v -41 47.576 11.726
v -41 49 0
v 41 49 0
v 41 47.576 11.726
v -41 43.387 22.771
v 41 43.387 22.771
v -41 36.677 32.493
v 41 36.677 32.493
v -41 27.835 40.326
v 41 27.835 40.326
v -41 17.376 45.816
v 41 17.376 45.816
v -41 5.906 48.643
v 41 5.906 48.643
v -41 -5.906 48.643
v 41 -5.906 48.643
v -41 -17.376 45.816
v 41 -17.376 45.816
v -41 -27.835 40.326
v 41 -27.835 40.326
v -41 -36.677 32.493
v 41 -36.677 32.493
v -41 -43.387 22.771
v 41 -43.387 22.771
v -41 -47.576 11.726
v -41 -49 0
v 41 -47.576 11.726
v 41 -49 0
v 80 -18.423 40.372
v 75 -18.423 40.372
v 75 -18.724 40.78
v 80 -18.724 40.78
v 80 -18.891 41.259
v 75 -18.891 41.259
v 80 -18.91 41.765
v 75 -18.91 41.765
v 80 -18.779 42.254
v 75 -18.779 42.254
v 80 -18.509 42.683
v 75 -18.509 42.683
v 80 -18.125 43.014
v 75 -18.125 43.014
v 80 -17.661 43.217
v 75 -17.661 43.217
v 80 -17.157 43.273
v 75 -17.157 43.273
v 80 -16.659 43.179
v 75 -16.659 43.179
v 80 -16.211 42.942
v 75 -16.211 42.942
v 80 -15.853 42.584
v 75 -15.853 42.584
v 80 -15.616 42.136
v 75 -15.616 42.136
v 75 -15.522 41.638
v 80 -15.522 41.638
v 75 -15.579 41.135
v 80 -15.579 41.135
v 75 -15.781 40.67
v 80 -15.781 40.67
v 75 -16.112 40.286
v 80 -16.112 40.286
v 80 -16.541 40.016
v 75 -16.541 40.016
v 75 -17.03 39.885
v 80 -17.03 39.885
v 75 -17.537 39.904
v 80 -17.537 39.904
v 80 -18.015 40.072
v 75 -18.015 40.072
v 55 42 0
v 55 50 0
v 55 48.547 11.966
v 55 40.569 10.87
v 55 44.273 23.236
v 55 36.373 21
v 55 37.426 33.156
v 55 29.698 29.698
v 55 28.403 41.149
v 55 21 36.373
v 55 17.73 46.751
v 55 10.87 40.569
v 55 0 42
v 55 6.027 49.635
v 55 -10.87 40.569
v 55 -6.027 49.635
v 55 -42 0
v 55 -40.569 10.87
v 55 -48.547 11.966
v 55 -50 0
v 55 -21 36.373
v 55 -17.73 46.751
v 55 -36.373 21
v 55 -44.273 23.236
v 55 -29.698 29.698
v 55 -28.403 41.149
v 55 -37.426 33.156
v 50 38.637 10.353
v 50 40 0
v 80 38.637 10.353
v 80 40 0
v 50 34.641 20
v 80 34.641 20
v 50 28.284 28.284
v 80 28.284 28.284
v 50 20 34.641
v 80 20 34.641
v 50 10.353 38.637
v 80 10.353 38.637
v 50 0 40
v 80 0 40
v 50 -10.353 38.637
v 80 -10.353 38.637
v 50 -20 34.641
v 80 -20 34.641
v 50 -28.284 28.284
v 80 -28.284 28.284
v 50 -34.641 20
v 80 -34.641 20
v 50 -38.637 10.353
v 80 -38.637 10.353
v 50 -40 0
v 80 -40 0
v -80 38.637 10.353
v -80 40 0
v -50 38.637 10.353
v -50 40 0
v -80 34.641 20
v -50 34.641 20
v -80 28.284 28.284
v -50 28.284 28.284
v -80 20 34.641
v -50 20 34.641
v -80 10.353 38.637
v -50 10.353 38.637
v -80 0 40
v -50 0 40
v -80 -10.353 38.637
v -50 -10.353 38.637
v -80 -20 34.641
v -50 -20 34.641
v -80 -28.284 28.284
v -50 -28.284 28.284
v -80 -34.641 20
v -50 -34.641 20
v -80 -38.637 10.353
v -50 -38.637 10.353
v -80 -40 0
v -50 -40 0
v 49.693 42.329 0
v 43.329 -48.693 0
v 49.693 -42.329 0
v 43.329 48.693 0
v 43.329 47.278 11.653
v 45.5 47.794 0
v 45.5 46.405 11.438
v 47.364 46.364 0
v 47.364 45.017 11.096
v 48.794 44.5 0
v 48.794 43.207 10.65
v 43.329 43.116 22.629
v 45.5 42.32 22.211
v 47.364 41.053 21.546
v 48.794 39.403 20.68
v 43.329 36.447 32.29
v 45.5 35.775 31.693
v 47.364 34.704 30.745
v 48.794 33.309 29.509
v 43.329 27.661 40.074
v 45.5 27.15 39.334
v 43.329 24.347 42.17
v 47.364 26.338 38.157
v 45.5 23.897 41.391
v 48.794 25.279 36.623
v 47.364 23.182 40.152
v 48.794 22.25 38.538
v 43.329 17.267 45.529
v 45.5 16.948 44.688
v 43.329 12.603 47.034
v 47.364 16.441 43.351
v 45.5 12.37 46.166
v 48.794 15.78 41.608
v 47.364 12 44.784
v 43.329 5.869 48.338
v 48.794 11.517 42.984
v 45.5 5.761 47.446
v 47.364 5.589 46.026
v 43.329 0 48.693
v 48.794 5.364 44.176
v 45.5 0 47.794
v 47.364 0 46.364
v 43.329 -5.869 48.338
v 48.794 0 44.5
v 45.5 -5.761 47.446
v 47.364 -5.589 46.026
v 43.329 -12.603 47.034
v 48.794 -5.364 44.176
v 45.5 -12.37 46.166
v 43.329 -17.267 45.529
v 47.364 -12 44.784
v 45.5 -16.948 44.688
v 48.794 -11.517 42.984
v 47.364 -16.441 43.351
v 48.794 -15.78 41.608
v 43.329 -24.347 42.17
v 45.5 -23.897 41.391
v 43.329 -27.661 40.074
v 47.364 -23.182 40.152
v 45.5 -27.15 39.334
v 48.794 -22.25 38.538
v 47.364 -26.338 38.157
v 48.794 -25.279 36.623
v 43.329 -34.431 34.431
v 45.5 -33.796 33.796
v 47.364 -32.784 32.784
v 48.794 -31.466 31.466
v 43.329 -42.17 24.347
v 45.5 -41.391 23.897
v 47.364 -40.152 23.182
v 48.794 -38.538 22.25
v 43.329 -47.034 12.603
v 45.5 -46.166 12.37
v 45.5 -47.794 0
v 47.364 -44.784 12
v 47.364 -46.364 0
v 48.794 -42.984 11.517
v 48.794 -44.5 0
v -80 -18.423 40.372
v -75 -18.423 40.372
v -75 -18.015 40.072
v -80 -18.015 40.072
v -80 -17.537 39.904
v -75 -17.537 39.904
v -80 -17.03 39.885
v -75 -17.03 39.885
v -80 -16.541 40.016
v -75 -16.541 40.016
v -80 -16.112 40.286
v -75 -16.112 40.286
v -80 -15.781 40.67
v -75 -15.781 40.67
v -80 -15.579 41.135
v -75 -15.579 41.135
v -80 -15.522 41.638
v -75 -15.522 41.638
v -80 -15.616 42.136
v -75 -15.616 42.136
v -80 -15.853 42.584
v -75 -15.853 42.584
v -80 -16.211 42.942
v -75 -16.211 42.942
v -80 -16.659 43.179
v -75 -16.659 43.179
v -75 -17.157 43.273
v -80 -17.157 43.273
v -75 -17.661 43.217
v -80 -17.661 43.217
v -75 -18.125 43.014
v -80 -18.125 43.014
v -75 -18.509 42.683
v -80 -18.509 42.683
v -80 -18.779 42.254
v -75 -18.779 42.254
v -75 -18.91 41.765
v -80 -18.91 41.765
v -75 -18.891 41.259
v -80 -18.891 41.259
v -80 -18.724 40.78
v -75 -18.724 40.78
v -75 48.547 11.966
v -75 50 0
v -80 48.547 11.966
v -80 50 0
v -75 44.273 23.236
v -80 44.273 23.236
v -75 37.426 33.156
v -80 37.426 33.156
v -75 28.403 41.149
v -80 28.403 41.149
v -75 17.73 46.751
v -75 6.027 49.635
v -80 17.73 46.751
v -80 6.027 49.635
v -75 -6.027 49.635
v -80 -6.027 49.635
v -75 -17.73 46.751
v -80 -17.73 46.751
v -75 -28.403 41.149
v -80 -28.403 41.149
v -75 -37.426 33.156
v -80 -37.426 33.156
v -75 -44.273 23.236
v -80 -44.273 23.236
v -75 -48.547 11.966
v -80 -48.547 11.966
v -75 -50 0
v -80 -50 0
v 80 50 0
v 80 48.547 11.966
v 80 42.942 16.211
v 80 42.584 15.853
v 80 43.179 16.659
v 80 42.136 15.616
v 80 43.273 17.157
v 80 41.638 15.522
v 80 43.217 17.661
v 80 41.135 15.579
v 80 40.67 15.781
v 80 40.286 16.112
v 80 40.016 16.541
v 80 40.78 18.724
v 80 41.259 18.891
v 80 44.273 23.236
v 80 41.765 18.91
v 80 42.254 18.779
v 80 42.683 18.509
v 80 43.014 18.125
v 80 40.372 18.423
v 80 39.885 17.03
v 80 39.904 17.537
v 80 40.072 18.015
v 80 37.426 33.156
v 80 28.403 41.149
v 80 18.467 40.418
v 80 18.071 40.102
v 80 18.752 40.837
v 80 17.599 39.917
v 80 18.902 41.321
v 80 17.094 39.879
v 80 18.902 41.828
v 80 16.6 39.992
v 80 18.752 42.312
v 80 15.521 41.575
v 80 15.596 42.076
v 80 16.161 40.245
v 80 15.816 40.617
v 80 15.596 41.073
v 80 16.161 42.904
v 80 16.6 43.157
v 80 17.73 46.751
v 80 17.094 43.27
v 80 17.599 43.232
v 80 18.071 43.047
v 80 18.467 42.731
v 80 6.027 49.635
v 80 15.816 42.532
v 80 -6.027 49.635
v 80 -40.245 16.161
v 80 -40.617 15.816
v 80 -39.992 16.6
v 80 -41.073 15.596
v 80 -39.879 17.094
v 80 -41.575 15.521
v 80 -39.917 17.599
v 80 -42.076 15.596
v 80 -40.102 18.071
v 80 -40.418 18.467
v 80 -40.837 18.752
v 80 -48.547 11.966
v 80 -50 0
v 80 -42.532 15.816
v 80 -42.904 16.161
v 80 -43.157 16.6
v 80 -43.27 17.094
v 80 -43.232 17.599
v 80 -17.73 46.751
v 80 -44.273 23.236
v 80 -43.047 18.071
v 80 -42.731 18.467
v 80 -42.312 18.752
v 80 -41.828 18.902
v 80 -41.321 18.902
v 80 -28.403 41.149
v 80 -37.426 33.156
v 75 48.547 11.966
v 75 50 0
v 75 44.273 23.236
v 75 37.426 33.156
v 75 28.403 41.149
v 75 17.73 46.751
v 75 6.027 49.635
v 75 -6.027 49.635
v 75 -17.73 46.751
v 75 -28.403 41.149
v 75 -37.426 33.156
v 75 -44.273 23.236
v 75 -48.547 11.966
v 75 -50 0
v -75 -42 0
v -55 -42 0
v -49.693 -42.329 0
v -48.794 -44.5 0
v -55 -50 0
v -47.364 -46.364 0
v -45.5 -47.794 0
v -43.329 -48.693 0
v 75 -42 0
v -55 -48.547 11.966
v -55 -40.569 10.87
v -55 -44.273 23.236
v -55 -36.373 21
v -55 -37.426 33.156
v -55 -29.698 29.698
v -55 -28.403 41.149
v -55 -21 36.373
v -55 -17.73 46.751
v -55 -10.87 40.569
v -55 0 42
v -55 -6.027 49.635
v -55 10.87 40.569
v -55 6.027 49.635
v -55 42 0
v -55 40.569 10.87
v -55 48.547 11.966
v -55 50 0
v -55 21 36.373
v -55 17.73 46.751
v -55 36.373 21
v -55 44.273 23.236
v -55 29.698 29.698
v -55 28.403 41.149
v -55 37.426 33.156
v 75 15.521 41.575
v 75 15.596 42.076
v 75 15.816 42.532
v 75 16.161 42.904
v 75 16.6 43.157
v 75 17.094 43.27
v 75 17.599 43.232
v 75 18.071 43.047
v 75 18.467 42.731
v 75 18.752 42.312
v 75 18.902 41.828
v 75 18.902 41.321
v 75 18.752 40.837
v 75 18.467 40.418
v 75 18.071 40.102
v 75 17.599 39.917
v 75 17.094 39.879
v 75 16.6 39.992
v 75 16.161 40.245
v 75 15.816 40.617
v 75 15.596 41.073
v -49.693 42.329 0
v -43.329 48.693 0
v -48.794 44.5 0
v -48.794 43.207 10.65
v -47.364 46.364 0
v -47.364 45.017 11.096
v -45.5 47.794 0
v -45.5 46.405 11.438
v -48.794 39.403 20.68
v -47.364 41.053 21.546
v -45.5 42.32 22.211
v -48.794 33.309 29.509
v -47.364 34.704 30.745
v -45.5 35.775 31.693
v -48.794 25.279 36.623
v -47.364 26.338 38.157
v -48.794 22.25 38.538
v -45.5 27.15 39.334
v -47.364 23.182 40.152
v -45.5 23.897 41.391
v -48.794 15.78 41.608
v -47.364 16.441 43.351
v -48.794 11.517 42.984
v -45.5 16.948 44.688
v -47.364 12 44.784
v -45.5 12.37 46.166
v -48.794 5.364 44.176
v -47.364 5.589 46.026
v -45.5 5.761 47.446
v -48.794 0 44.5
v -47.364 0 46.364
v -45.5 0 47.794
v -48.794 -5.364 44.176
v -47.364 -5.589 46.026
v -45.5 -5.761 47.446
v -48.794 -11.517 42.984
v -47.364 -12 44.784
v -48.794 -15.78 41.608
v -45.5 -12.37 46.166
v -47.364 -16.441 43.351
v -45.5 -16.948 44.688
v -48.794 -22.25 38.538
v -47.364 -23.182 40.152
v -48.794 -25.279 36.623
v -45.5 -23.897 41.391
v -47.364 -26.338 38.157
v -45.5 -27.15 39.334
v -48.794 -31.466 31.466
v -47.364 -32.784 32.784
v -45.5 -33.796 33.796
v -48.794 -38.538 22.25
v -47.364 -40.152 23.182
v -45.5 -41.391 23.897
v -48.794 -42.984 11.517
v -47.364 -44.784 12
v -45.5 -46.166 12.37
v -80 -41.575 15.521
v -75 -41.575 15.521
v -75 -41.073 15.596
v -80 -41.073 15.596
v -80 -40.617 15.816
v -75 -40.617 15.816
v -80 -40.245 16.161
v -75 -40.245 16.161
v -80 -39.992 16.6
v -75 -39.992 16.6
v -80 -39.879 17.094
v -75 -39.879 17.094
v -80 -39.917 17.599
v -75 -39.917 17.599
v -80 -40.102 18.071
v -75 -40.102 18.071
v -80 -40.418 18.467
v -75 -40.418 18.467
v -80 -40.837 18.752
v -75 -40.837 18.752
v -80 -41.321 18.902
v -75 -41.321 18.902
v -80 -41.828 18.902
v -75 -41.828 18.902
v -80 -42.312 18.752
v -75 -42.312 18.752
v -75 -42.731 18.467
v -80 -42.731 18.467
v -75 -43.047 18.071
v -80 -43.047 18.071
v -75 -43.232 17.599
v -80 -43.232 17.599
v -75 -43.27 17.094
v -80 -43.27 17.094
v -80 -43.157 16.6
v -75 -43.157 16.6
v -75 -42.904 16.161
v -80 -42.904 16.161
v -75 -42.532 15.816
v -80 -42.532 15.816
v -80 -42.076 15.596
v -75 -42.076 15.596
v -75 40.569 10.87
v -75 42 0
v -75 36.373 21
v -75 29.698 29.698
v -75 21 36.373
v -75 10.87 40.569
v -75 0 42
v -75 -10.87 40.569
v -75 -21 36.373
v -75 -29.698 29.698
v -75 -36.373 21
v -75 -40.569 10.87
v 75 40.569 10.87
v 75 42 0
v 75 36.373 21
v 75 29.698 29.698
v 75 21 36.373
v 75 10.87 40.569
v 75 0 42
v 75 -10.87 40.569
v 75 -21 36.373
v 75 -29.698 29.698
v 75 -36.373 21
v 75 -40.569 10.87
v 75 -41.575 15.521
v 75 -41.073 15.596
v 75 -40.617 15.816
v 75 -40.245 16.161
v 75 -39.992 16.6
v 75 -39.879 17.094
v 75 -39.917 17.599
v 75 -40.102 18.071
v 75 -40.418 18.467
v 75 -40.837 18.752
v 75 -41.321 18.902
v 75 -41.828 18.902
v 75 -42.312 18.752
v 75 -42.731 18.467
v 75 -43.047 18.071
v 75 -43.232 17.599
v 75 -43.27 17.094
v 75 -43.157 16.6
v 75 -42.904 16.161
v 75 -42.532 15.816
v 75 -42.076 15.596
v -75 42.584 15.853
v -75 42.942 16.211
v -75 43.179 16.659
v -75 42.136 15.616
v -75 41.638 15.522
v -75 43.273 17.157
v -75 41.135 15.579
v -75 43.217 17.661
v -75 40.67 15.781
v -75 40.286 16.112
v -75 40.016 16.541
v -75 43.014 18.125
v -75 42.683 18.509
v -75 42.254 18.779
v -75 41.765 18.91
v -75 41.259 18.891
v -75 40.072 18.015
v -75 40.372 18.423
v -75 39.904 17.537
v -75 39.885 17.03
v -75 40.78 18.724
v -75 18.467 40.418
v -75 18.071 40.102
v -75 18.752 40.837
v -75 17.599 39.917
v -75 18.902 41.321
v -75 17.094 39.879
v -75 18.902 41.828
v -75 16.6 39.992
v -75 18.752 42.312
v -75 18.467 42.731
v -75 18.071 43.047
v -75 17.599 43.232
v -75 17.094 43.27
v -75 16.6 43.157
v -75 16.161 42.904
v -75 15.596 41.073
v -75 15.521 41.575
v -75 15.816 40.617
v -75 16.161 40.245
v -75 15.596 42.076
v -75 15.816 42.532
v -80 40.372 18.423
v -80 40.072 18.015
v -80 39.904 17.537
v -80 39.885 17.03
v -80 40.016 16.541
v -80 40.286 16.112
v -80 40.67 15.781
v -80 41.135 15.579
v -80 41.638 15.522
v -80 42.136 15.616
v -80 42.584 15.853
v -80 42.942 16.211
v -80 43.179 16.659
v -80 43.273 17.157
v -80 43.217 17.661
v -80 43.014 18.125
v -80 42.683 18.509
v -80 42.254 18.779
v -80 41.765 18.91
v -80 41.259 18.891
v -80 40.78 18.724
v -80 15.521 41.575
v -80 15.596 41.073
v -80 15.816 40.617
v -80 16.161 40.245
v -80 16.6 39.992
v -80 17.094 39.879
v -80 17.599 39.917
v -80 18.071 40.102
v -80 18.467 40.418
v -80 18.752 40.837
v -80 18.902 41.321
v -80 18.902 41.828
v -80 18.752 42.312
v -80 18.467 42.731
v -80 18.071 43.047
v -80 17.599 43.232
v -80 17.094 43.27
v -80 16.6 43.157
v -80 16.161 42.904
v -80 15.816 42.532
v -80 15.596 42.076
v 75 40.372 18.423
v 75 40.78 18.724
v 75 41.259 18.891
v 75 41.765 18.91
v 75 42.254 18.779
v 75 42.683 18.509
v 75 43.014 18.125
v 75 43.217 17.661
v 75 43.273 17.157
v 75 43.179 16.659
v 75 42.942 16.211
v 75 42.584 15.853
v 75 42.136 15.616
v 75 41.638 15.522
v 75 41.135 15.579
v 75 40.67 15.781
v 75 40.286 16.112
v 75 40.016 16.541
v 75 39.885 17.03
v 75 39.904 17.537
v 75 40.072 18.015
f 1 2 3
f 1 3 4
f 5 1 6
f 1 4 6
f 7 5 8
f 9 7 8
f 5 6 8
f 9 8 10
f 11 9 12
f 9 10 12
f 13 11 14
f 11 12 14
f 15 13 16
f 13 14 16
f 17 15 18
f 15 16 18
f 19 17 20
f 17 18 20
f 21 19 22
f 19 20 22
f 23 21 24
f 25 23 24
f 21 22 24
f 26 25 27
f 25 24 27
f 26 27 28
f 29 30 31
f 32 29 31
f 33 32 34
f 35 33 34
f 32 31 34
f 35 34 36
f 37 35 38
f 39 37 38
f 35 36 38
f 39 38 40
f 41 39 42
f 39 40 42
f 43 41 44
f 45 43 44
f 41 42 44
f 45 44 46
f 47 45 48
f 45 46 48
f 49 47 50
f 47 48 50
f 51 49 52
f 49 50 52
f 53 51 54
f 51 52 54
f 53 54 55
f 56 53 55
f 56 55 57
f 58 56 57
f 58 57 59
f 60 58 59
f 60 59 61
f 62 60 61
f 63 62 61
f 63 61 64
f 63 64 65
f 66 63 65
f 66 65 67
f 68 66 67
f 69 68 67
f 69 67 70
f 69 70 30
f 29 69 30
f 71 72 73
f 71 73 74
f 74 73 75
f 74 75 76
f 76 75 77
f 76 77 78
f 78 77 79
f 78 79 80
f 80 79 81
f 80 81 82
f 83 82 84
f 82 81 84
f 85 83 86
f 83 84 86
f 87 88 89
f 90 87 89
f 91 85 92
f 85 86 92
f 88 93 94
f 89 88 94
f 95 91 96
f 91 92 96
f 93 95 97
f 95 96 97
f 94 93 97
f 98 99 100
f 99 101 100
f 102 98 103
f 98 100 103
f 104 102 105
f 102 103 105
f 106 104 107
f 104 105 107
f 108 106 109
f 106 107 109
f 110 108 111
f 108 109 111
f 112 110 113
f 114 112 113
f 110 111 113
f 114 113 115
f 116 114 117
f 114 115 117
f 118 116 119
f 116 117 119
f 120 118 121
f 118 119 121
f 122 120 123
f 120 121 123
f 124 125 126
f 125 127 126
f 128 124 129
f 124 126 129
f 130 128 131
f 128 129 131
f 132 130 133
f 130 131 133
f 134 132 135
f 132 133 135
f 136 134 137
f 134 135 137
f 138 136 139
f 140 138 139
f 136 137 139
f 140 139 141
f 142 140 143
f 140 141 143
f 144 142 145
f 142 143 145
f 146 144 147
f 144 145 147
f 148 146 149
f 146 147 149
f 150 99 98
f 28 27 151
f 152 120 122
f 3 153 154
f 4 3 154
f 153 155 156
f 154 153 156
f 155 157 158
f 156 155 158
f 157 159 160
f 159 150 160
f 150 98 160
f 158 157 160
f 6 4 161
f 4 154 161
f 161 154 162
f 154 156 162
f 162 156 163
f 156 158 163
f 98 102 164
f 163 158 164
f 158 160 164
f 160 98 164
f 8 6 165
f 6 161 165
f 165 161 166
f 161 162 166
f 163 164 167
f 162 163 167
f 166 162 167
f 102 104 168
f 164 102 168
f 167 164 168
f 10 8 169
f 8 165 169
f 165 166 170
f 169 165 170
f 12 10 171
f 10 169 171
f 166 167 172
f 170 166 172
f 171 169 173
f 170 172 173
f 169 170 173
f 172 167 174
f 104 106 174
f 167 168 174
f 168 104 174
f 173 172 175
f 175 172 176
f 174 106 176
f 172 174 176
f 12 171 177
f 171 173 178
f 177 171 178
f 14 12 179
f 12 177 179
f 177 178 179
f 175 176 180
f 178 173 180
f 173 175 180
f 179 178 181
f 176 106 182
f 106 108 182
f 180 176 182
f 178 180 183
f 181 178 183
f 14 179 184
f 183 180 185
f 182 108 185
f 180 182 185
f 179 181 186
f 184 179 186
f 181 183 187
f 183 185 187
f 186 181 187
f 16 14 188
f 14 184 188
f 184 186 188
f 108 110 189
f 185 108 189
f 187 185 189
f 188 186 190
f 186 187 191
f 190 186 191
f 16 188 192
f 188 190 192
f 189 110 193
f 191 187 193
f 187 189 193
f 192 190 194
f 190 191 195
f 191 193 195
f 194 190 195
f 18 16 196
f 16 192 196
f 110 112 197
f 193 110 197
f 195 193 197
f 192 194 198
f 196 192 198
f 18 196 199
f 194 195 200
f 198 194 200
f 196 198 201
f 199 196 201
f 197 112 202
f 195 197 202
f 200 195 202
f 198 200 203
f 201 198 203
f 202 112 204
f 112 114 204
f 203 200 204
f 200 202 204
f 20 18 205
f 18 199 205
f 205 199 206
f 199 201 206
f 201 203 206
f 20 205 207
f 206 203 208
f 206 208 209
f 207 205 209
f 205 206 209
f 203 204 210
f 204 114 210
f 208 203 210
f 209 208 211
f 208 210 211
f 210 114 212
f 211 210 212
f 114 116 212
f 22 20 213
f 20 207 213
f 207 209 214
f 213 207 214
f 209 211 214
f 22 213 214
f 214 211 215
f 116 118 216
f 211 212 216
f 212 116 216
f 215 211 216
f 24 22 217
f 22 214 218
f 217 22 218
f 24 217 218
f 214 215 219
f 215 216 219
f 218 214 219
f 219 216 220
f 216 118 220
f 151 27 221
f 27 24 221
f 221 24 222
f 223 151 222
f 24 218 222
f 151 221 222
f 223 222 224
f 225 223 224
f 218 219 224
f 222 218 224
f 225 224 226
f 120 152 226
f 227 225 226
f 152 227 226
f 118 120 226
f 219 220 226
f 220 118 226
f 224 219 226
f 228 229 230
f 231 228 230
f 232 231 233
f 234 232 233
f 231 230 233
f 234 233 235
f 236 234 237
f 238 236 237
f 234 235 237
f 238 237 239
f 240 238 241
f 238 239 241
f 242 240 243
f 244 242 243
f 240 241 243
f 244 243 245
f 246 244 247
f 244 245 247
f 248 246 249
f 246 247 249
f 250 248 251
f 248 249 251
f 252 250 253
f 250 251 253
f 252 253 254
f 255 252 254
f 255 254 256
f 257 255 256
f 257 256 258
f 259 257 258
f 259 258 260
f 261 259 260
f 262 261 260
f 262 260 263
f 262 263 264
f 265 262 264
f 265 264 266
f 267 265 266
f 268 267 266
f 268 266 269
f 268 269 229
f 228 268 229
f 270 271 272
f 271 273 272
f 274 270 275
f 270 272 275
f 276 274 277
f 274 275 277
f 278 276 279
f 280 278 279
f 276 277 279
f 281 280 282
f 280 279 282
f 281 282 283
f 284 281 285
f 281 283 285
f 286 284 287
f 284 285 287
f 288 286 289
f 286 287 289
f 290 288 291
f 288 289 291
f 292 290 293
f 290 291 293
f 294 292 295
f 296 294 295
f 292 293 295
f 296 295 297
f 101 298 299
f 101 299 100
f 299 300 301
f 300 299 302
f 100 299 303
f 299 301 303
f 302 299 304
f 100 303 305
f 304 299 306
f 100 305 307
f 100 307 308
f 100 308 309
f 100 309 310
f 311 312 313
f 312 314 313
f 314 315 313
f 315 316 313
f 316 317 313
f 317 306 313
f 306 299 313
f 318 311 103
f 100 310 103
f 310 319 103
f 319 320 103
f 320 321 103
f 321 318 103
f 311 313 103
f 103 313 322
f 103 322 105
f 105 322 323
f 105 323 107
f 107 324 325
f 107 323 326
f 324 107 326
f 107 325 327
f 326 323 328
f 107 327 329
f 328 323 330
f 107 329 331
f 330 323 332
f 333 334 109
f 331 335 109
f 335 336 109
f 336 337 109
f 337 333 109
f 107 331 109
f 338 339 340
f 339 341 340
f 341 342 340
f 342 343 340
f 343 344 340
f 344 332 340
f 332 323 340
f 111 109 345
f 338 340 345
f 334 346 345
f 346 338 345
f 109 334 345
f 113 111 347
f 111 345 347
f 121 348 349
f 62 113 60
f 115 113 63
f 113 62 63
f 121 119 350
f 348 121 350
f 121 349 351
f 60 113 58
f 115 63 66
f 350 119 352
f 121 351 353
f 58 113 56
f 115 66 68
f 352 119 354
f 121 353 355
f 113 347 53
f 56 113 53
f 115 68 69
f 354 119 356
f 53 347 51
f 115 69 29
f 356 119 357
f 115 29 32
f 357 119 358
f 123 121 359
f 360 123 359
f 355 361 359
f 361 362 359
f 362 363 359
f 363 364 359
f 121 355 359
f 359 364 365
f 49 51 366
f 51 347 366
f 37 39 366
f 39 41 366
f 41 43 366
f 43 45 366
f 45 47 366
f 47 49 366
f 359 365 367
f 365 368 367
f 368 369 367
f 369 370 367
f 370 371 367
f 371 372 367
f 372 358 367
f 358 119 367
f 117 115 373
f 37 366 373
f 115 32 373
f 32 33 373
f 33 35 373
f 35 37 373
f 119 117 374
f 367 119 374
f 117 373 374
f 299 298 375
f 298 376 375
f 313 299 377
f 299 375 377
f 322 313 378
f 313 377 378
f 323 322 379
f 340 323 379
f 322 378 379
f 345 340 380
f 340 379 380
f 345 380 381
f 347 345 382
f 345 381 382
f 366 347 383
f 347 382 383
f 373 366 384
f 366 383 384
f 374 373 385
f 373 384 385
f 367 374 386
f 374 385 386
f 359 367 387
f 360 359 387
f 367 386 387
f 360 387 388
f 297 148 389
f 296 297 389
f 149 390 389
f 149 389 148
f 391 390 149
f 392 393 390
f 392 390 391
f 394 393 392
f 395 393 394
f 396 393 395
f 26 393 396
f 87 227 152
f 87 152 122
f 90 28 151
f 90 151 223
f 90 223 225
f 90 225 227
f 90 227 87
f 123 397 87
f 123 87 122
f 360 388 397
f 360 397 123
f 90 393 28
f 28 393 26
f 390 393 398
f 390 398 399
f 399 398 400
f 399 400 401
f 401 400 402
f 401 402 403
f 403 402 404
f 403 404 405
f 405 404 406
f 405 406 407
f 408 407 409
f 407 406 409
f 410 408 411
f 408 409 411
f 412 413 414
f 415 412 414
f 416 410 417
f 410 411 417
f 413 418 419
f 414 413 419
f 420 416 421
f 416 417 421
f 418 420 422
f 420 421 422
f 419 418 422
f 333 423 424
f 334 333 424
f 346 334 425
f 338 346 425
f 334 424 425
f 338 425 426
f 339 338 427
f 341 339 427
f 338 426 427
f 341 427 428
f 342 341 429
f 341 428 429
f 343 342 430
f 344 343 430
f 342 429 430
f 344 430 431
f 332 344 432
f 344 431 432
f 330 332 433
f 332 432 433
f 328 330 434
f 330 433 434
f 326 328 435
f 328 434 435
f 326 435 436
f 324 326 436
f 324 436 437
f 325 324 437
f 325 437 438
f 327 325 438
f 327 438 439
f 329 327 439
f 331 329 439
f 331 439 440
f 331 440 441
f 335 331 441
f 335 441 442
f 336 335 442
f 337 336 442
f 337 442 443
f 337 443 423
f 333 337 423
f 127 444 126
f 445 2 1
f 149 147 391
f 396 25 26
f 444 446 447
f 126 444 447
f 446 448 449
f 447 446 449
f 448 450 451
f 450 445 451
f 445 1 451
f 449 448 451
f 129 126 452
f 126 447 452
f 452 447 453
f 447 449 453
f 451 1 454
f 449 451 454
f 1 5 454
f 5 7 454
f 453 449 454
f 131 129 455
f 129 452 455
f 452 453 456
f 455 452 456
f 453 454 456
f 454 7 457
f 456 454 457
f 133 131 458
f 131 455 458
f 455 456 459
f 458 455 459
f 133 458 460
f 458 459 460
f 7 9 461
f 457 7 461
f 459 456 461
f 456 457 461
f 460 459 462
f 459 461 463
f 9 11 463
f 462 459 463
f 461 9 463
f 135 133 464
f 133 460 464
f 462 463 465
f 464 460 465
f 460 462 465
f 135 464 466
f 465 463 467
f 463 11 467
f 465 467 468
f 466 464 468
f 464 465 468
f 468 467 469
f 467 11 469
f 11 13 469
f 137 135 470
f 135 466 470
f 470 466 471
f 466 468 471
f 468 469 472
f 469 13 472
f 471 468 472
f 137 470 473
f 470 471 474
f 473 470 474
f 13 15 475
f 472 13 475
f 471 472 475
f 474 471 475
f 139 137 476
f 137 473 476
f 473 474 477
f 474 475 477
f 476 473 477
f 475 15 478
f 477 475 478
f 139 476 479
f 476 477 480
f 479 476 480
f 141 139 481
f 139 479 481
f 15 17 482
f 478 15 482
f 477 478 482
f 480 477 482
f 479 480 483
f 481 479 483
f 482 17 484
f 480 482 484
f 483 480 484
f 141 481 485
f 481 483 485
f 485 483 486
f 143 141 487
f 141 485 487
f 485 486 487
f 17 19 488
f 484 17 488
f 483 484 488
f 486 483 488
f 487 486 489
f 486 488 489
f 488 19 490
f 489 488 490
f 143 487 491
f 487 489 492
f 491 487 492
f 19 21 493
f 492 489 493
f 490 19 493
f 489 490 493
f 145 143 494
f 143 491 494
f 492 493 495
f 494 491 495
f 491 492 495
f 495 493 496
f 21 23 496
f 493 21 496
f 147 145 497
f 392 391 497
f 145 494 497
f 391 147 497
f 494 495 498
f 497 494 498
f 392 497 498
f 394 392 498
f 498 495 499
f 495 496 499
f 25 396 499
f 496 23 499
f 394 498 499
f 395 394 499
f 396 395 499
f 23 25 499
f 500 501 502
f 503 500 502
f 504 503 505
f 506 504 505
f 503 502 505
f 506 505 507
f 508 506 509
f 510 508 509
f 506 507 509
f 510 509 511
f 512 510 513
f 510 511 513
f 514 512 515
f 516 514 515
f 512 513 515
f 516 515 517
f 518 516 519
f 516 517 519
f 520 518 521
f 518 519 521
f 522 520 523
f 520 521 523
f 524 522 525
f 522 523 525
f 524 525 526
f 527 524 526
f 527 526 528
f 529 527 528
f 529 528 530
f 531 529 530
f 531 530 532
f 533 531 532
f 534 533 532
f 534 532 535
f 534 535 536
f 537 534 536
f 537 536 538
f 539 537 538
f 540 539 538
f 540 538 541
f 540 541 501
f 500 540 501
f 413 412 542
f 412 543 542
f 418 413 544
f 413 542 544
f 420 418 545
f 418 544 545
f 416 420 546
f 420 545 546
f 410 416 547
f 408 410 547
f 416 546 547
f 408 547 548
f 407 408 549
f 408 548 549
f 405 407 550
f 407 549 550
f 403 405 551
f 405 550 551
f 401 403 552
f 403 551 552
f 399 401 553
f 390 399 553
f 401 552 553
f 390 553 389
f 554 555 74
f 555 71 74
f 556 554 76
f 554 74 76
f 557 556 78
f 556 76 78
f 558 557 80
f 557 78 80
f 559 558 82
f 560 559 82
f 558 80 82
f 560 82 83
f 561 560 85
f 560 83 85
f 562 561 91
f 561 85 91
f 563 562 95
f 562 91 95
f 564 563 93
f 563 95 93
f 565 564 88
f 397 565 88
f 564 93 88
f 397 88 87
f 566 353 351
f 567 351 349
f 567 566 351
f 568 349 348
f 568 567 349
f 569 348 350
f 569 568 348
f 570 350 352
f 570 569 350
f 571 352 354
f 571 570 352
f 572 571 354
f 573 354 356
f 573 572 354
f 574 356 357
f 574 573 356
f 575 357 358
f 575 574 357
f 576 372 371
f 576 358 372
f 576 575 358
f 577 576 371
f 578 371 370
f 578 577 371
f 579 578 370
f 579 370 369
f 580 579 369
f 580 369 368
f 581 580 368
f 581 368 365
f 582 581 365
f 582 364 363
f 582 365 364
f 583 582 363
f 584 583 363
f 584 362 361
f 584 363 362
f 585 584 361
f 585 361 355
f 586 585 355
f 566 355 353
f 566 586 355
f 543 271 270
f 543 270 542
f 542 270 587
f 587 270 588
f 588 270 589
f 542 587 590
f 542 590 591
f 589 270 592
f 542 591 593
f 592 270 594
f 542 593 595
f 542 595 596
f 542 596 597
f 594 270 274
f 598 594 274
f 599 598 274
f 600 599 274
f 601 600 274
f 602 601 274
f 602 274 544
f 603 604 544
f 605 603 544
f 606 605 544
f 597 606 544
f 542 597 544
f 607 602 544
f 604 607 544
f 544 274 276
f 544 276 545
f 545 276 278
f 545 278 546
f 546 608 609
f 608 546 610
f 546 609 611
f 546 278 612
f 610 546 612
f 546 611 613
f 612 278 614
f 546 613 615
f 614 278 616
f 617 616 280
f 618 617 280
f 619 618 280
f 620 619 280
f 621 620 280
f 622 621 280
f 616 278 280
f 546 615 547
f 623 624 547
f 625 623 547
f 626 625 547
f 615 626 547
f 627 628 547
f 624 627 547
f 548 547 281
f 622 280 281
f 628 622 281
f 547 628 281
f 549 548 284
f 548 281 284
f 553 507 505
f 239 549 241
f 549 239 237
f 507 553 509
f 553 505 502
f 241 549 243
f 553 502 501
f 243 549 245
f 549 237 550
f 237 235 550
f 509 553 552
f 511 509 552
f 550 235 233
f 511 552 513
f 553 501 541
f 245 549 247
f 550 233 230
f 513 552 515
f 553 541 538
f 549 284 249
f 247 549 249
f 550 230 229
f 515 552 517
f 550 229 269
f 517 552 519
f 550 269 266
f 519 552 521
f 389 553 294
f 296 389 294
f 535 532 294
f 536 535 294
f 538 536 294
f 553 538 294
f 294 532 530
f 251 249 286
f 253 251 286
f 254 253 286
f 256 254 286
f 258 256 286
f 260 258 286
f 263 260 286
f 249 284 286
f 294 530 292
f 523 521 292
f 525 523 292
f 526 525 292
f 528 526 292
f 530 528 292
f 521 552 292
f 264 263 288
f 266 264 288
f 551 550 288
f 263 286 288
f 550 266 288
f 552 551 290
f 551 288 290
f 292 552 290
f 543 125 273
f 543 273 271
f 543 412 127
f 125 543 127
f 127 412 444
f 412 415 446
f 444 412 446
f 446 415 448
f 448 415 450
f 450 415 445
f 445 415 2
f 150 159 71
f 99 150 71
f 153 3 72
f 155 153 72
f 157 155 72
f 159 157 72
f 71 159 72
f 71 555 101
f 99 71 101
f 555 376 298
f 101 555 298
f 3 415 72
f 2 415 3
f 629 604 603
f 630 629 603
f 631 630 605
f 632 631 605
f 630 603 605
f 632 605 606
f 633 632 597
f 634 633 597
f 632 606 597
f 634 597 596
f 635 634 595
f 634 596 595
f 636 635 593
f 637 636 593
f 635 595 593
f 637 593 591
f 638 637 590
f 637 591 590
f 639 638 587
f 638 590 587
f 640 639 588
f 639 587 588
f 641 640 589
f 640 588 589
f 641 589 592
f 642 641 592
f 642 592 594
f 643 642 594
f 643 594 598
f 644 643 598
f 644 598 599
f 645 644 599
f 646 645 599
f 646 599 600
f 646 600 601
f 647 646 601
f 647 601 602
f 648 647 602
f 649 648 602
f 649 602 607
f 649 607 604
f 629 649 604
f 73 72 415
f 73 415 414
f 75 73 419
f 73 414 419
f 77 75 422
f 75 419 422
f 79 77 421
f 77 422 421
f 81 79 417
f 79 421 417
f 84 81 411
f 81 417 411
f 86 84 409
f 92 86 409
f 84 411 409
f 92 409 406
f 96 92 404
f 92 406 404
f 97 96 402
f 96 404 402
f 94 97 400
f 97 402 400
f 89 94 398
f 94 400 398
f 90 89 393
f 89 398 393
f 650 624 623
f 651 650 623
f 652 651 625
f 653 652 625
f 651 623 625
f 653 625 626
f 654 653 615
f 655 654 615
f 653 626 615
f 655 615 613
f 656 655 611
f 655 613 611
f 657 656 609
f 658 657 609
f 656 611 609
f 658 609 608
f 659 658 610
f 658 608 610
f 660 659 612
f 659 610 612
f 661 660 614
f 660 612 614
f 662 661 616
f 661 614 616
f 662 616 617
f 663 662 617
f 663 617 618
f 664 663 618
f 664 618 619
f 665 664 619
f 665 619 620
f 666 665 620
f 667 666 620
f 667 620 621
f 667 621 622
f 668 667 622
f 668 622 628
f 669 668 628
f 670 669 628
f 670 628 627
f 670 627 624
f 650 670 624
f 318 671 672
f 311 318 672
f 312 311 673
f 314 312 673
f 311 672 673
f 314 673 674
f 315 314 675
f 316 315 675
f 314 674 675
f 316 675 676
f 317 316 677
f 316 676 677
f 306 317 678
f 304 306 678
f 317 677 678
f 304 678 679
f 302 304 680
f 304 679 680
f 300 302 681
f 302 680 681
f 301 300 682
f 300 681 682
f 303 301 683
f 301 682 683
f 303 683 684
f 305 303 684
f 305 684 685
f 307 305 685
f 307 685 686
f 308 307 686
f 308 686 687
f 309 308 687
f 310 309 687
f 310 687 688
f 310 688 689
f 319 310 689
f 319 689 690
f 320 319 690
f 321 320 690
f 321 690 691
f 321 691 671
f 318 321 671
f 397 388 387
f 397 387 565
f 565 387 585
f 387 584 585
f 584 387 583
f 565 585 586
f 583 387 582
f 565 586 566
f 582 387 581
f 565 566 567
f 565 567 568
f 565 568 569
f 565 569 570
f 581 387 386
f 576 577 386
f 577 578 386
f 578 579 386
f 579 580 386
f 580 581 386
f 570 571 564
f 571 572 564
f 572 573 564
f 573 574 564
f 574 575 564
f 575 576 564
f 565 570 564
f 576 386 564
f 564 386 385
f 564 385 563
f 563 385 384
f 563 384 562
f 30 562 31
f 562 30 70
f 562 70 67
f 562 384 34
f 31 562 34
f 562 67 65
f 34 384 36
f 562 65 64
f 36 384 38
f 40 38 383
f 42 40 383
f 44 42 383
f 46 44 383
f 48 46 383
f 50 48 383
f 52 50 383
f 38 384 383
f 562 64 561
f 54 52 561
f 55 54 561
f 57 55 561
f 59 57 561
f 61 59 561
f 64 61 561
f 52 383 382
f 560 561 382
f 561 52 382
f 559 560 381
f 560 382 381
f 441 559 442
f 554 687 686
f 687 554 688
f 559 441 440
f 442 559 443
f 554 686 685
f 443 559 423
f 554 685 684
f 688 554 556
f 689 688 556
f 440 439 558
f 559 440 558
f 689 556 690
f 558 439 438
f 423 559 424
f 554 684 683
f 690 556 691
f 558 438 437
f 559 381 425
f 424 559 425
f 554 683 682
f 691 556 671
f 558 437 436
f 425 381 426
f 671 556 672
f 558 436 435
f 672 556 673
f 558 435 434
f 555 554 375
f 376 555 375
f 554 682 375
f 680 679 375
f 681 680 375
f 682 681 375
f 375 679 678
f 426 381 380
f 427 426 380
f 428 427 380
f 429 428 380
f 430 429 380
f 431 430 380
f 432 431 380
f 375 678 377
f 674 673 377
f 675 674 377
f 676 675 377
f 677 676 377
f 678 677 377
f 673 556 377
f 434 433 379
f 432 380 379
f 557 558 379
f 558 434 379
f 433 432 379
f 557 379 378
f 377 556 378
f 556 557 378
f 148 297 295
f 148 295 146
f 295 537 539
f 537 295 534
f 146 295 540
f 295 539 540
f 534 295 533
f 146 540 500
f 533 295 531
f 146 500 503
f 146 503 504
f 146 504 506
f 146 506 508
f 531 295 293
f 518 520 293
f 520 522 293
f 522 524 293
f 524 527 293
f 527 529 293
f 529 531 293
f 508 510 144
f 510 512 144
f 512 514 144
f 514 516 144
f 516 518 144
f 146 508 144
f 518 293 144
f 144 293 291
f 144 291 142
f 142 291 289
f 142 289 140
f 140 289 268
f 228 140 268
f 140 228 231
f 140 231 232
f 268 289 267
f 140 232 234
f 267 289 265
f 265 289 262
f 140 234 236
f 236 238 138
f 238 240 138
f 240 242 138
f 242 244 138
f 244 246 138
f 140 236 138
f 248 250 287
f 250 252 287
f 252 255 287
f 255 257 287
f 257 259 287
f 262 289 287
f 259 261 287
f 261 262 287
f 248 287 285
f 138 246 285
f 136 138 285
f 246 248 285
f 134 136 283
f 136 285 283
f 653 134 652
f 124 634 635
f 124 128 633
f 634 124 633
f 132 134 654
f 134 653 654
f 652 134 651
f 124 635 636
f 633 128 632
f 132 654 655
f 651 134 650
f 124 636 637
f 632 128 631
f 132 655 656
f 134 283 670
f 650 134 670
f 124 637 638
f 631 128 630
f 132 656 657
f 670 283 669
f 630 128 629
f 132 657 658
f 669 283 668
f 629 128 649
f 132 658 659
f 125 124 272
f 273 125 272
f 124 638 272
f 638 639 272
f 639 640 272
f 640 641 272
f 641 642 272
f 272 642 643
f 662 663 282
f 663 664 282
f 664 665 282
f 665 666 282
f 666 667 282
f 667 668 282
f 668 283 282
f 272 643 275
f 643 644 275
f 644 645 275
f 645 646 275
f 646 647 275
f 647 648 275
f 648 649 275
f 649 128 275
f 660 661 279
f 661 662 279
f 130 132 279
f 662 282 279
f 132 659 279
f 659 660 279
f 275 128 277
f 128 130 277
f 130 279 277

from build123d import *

# Parameters (mm, degrees)
REVOLVE_1_ANGLE          = 180
HOLE_WIZARD_M3_1_D       = 3.4
HOLE_WIZARD_M3_1_DEPTH   = 5
PATTERN_CIRCULAR_1_COUNT = 4
PATTERN_CIRCULAR_1_ANGLE = 135
MIRROR_1_COPY_1_D        = 3.4
MIRROR_1_COPY_1_DEPTH    = 5
MIRROR_1_COPY_2_D        = 3.4
MIRROR_1_COPY_2_DEPTH    = 5
MIRROR_1_COPY_3_D        = 3.4
MIRROR_1_COPY_3_DEPTH    = 5
FILLET_1_R               = 9


with BuildPart() as part:
    # ｽｹｯﾁ1 → 回転1 (revolve)
    with BuildSketch(Plane.XY):
        Polygon((-80, 40), (-50, 40), (-50, 49), (50, 49), (50, 40), (80, 40), (80, 50), (75, 50), (75, 42), (55, 42), (55, 50), (-55, 50), (-55, 42), (-75, 42), (-75, 50), (-80, 50), align=None)
    revolve(axis=Axis((-50, 0, 0), (1, 0, 0)), revolution_arc=REVOLVE_1_ANGLE)

    # M3 すきま穴1
    with Locations(Plane.ZY.offset(80)):
        with Locations((17.220754456, -41.574578963)):
            hole_wizard_m3_1 = Hole(HOLE_WIZARD_M3_1_D / 2, depth=HOLE_WIZARD_M3_1_DEPTH)

    # 円形ﾊﾟﾀｰﾝ1: M3 すきま穴1 ×4 about axis
    pattern_circular_1_axis = Axis((0, 0, 0), (-1, 0, 0))
    for i in range(1, PATTERN_CIRCULAR_1_COUNT):
        add(hole_wizard_m3_1.rotate(pattern_circular_1_axis, i * PATTERN_CIRCULAR_1_ANGLE / (PATTERN_CIRCULAR_1_COUNT - 1)), mode=Mode.SUBTRACT)

    # ﾐﾗｰ1: M3 すきま穴1 across plane
    add(hole_wizard_m3_1.mirror(Plane(origin=(0, 0, 0), x_dir=(0, 0, 1), z_dir=(1, 0, 0))), mode=Mode.SUBTRACT)

    # ﾐﾗｰ1 copy 1
    with Locations(Plane(origin=(80, 0, 0), x_dir=(0, 0.7071067811865487, 0.7071067811865464), z_dir=(1, 0, 0))):
        with Locations((17.220754456, 41.574578963)):
            Hole(MIRROR_1_COPY_1_D / 2, depth=MIRROR_1_COPY_1_DEPTH)

    # ﾐﾗｰ1 copy 2
    with Locations(Plane.YZ.offset(80)):
        with Locations((17.220754456, 41.574578963)):
            Hole(MIRROR_1_COPY_2_D / 2, depth=MIRROR_1_COPY_2_DEPTH)

    # ﾐﾗｰ1 copy 3
    with Locations(Plane(origin=(80, 0, 0), x_dir=(0, 0.7071067811865441, -0.7071067811865509), z_dir=(1, 0, 0))):
        with Locations((17.220754456, 41.574578963)):
            Hole(MIRROR_1_COPY_3_D / 2, depth=MIRROR_1_COPY_3_DEPTH)

    # ﾌｨﾚｯﾄ1
    fillet_1_edges = [part.edges().sort_by_distance(p)[0] for p in [
        (-50, 0, 49),
        (50, 0, 49),
    ]]
    fillet(fillet_1_edges, radius=FILLET_1_R - 0.0001)  # a hair under: the kernel refuses the full size


solid = part.part
